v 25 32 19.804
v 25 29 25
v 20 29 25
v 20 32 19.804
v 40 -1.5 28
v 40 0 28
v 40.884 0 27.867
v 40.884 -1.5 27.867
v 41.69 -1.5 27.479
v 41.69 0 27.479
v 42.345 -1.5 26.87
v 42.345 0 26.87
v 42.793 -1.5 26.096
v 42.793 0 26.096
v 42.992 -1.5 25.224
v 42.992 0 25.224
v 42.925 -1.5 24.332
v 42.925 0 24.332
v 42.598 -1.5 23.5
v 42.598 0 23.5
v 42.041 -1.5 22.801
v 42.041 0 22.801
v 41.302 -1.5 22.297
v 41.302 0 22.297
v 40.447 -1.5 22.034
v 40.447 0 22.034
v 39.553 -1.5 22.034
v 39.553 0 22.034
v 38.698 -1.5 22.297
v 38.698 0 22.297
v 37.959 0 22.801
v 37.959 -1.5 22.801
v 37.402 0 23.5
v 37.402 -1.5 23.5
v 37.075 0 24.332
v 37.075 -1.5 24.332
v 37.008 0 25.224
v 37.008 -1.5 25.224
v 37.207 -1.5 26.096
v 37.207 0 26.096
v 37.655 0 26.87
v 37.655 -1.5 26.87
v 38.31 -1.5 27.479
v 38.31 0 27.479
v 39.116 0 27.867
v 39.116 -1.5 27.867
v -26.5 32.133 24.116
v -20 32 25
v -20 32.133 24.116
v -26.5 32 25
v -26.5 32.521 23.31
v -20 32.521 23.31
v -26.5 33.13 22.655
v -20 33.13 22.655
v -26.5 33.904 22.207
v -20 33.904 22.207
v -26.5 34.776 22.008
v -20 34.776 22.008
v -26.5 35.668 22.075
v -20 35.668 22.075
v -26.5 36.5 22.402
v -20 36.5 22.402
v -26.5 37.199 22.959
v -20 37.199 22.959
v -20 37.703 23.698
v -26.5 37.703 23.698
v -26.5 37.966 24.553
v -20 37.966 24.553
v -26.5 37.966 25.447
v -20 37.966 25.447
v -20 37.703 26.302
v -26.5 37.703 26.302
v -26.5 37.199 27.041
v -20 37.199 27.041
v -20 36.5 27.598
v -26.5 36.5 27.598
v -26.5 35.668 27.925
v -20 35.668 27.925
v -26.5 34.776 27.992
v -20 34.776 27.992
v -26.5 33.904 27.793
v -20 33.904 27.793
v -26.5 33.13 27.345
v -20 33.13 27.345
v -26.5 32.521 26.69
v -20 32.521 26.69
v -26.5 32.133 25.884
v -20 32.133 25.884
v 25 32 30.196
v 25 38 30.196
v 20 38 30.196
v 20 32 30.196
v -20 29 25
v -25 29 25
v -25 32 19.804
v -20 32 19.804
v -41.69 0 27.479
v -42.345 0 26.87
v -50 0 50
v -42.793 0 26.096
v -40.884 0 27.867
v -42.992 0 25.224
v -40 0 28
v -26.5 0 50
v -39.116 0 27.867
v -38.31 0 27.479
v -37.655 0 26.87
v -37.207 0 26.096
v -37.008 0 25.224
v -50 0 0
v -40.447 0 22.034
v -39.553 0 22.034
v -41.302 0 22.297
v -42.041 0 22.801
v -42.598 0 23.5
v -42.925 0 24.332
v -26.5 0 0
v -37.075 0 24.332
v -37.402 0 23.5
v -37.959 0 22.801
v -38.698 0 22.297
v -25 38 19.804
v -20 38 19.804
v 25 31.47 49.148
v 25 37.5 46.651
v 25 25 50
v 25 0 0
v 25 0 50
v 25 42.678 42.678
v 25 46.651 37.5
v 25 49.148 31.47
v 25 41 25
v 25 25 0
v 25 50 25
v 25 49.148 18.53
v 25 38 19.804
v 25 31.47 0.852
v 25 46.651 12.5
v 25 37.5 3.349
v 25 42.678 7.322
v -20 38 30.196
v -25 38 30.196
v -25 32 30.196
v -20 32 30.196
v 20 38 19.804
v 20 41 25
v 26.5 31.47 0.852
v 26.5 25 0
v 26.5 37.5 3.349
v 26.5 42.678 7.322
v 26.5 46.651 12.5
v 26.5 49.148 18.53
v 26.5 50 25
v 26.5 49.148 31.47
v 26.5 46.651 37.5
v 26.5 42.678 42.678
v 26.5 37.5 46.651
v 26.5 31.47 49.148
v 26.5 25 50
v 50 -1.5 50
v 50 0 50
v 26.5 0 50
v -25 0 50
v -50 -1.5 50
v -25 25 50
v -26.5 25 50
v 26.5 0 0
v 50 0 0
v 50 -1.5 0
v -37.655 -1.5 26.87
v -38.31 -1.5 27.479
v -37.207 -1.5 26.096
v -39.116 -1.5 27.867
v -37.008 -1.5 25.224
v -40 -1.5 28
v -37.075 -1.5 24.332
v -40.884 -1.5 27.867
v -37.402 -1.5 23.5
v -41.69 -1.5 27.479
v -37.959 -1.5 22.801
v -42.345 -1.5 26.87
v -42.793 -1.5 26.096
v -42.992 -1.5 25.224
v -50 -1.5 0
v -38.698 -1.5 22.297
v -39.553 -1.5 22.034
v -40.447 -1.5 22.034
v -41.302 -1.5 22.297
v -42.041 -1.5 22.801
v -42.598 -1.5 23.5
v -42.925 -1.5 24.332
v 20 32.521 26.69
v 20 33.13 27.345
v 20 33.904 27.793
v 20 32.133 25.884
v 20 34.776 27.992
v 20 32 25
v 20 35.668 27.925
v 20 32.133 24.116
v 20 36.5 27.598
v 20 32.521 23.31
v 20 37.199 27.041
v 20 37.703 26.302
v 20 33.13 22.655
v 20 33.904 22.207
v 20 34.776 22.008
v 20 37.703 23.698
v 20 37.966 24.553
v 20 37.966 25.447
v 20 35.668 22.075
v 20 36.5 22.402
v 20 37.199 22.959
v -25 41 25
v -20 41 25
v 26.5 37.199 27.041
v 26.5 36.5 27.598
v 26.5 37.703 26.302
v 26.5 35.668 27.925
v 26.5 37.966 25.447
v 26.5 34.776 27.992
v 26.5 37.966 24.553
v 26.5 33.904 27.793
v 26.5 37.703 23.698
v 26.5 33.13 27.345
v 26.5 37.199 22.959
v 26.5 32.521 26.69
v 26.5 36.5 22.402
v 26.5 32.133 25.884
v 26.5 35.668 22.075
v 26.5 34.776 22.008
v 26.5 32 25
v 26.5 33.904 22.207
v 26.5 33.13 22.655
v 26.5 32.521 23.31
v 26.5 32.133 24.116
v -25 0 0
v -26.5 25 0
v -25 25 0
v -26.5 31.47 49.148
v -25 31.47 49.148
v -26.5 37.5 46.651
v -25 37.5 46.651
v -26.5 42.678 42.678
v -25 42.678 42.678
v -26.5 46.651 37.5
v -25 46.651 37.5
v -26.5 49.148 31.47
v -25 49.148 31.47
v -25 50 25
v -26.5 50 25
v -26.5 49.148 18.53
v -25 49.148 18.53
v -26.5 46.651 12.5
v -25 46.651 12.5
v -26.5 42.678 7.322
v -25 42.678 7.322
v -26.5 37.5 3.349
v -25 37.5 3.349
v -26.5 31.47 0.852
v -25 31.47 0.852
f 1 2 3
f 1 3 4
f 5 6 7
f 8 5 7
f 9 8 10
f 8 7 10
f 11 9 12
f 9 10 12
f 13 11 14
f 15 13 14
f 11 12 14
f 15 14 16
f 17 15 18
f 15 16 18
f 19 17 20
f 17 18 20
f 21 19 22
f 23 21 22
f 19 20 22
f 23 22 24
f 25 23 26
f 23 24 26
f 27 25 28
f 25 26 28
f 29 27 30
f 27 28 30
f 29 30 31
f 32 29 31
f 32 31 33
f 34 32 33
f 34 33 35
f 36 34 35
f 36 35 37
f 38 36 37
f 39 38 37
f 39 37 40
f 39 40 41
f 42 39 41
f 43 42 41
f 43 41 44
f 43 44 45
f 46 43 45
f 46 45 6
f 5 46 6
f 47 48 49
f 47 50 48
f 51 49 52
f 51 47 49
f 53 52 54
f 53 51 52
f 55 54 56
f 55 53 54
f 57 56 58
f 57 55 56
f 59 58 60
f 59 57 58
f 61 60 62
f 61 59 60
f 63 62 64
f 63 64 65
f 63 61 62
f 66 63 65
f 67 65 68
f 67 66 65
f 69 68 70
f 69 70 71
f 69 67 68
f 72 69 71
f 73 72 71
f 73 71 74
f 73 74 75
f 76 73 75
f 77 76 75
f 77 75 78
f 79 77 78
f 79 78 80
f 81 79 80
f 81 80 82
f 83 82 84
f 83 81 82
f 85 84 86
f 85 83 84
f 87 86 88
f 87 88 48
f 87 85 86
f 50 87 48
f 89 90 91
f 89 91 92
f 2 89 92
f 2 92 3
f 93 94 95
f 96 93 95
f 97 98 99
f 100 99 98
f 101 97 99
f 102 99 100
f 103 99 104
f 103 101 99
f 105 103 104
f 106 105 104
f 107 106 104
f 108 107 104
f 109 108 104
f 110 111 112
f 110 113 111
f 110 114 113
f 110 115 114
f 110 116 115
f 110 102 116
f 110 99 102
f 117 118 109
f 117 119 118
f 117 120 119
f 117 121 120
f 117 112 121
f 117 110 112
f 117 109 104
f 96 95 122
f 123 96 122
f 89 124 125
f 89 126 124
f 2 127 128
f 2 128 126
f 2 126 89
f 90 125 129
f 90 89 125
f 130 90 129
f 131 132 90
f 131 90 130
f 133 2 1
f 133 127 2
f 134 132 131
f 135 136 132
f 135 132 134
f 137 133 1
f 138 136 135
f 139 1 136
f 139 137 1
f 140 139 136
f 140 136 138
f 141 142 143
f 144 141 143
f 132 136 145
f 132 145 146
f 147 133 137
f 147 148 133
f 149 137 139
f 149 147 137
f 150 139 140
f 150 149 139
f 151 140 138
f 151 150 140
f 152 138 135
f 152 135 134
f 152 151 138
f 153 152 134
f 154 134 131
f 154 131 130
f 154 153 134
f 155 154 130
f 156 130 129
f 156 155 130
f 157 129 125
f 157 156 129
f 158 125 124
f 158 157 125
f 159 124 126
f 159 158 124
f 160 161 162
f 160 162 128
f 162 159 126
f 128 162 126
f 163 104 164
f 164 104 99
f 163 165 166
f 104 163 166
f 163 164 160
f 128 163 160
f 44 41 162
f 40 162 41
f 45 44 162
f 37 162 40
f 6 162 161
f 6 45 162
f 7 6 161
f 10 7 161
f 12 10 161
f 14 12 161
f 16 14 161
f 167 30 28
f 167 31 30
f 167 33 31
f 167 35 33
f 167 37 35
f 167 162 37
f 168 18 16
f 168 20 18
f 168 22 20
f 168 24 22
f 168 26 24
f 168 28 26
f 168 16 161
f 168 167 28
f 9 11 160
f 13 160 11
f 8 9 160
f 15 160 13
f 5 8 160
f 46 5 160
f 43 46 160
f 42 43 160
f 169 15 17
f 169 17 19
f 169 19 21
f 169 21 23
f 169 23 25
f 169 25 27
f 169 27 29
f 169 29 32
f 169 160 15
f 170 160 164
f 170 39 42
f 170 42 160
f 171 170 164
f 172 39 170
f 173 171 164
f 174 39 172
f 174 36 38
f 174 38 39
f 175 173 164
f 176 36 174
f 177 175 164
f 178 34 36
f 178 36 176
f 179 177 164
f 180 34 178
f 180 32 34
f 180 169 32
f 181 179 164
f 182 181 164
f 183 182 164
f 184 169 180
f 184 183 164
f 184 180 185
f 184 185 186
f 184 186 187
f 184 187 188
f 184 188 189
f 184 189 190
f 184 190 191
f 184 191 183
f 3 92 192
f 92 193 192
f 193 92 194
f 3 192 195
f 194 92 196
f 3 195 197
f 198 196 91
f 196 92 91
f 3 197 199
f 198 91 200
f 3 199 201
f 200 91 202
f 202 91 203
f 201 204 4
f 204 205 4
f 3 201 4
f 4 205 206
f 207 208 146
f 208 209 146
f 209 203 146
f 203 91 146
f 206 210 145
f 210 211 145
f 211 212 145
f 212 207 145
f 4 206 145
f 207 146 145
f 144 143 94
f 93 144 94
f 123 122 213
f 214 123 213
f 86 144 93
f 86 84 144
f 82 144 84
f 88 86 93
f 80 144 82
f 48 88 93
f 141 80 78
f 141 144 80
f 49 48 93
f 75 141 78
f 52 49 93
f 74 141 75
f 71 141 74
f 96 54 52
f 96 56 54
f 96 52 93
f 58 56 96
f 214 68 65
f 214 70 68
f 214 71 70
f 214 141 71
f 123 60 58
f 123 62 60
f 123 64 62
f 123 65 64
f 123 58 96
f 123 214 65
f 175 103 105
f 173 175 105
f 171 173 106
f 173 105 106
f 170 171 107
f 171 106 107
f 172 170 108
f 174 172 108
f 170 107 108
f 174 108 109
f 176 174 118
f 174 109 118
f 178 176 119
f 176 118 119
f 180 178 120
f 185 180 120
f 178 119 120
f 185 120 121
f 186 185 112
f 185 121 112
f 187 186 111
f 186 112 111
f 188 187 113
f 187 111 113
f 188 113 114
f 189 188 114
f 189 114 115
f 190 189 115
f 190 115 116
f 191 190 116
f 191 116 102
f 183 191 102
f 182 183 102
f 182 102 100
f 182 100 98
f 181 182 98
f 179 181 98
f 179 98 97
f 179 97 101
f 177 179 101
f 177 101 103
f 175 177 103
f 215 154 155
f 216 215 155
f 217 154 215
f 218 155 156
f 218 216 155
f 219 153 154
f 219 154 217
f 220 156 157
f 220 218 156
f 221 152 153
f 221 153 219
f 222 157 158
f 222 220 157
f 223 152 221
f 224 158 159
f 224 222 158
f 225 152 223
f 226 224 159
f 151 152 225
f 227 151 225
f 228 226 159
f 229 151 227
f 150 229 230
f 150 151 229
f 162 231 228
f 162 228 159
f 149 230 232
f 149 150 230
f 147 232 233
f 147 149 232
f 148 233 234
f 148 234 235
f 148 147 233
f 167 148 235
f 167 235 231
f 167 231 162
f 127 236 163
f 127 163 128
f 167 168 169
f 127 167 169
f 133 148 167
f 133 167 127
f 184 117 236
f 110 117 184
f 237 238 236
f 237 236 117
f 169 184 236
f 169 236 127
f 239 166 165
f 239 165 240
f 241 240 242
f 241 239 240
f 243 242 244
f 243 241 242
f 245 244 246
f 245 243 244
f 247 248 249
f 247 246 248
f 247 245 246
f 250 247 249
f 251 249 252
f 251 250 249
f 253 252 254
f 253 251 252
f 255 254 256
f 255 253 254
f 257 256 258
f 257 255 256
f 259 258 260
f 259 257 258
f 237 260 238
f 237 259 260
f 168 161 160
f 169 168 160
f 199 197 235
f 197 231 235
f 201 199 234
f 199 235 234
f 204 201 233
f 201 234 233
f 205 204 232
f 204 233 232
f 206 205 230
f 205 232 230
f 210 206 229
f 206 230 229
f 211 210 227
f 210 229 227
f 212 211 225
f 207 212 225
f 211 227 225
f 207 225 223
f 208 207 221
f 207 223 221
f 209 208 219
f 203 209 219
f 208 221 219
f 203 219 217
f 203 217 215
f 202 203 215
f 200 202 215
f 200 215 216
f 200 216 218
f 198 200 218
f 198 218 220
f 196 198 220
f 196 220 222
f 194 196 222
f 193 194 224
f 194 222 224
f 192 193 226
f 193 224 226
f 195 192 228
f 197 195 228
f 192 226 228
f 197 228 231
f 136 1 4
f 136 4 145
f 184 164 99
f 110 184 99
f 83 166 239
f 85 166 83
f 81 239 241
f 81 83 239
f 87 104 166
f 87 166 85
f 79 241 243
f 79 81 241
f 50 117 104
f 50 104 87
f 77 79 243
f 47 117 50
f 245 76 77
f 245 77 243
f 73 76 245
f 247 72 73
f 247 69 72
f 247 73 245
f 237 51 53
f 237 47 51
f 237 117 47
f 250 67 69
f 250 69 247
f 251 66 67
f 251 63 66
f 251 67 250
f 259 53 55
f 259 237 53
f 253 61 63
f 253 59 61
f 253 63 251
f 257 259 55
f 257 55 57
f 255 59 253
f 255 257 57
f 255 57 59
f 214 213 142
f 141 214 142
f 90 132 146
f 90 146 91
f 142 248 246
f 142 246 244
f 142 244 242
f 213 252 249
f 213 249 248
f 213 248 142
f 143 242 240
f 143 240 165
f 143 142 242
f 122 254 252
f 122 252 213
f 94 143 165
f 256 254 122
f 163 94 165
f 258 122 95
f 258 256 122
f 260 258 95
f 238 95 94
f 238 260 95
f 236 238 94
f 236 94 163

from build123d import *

# Parameters (mm, degrees)
BOSS_EXTRUDE1_DEPTH = 50
CUT_EXTRUDE1_REACH  = 88.603
SKETCH2_R           = 3
SKETCH3_R           = 3
CUT_EXTRUDE2_DEPTH  = 70
FILLET2_RADIUS      = 25
FILLET2_LENGTH      = 1.5
FILLET3_RADIUS      = 25
FILLET3_LENGTH      = 1.5
SKETCH4_R           = 3
BOSS_EXTRUDE2_DEPTH = 5


with BuildPart() as part:
    # Sketch1 → Boss-Extrude1 (new body)
    with BuildSketch(Plane.XY):
        Polygon((50, -1.5), (-50, -1.5), (-50, 0), (-26.5, 0), (-26.5, 50), (-25, 50), (-25, 0), (25, 0), (25, 50), (26.5, 50), (26.5, 0), (50, 0), align=None)
    extrude(amount=BOSS_EXTRUDE1_DEPTH)

    # Sketch2 → Cut-Extrude1 (cut, up to next)
    with BuildSketch(Plane(origin=(0, 0, 0), x_dir=(1, 0, 0), z_dir=(0, 1, 0)), mode=Mode.PRIVATE) as cut_extrude1_sk1:
        with Locations(Location((-40, -25, 0), (0, 0, 270))):
            Circle(SKETCH2_R)
    cut_extrude1_tool1 = extrude(cut_extrude1_sk1.sketch, amount=-CUT_EXTRUDE1_REACH, mode=Mode.PRIVATE) & part.part
    # Sketch2 → Cut-Extrude1 (cut, up to next)
    with BuildSketch(Plane(origin=(0, 0, 0), x_dir=(1, 0, 0), z_dir=(0, 1, 0)), mode=Mode.PRIVATE) as cut_extrude1_sk2:
        with Locations(Location((40, -25, 0), (0, 0, 270))):
            Circle(SKETCH2_R)
    cut_extrude1_tool2 = extrude(cut_extrude1_sk2.sketch, amount=-CUT_EXTRUDE1_REACH, mode=Mode.PRIVATE) & part.part
    add(cut_extrude1_tool1.solids().sort_by_distance((-40, 0, 25))[0], mode=Mode.SUBTRACT)
    add(cut_extrude1_tool2.solids().sort_by_distance((40, 0, 25))[0], mode=Mode.SUBTRACT)

    # Sketch3 → Cut-Extrude2 (cut)
    with BuildSketch(Plane.ZY.offset(26.5)):
        with Locations(Location((25, 35, 0), (0, 0, 270))):
            Circle(SKETCH3_R)
    extrude(amount=-CUT_EXTRUDE2_DEPTH, mode=Mode.SUBTRACT)

    # Fillet2: full round fillet: the end face becomes a half cylinder, R = half its width
    fillet2_face = Plane((25.75, 50, 25), x_dir=(1, 0, 0), z_dir=(0, 1, 0))  # on the end face: x along it, z out of the body
    fillet2_slab = fillet2_face.offset(-FILLET2_RADIUS / 2) * Box(FILLET2_LENGTH, 2 * FILLET2_RADIUS, FILLET2_RADIUS, mode=Mode.PRIVATE)  # the body's end, R deep
    fillet2_round = Plane((25.75, 25, 25), x_dir=(0, 1, 0), z_dir=(1, 0, 0)) * Cylinder(FILLET2_RADIUS, FILLET2_LENGTH, mode=Mode.PRIVATE)  # its axis R under the face
    add(fillet2_slab - fillet2_round, mode=Mode.SUBTRACT)

    # Fillet3: full round fillet: the end face becomes a half cylinder, R = half its width
    fillet3_face = Plane((-25.75, 50, 25), x_dir=(-1, 0, 0), z_dir=(0, 1, 0))  # on the end face: x along it, z out of the body
    fillet3_slab = fillet3_face.offset(-FILLET3_RADIUS / 2) * Box(FILLET3_LENGTH, 2 * FILLET3_RADIUS, FILLET3_RADIUS, mode=Mode.PRIVATE)  # the body's end, R deep
    fillet3_round = Plane((-25.75, 25, 25), x_dir=(0, 1, 0), z_dir=(-1, 0, 0)) * Cylinder(FILLET3_RADIUS, FILLET3_LENGTH, mode=Mode.PRIVATE)  # its axis R under the face
    add(fillet3_slab - fillet3_round, mode=Mode.SUBTRACT)

    # Sketch4 → Boss-Extrude2 (add)
    with BuildSketch(Plane(origin=(-25, 0, 0), x_dir=(0, 0, -1), z_dir=(1, 0, 0))):
        Polygon((-30.196152423, 32), (-25, 29), (-19.803847577, 32), (-19.803847577, 38), (-25, 41), (-30.196152423, 38), align=None)
        with Locations(Location((-25, 35, 0), (0, 0, 270))):
            Circle(SKETCH4_R, mode=Mode.SUBTRACT)
    boss_extrude2 = extrude(amount=BOSS_EXTRUDE2_DEPTH)

    # Mirror1: Boss-Extrude2 across plane
    add(boss_extrude2.mirror(Plane(origin=(0, 0, 0), x_dir=(0, 0, 1), z_dir=(1, 0, 0))))


solid = part.part
